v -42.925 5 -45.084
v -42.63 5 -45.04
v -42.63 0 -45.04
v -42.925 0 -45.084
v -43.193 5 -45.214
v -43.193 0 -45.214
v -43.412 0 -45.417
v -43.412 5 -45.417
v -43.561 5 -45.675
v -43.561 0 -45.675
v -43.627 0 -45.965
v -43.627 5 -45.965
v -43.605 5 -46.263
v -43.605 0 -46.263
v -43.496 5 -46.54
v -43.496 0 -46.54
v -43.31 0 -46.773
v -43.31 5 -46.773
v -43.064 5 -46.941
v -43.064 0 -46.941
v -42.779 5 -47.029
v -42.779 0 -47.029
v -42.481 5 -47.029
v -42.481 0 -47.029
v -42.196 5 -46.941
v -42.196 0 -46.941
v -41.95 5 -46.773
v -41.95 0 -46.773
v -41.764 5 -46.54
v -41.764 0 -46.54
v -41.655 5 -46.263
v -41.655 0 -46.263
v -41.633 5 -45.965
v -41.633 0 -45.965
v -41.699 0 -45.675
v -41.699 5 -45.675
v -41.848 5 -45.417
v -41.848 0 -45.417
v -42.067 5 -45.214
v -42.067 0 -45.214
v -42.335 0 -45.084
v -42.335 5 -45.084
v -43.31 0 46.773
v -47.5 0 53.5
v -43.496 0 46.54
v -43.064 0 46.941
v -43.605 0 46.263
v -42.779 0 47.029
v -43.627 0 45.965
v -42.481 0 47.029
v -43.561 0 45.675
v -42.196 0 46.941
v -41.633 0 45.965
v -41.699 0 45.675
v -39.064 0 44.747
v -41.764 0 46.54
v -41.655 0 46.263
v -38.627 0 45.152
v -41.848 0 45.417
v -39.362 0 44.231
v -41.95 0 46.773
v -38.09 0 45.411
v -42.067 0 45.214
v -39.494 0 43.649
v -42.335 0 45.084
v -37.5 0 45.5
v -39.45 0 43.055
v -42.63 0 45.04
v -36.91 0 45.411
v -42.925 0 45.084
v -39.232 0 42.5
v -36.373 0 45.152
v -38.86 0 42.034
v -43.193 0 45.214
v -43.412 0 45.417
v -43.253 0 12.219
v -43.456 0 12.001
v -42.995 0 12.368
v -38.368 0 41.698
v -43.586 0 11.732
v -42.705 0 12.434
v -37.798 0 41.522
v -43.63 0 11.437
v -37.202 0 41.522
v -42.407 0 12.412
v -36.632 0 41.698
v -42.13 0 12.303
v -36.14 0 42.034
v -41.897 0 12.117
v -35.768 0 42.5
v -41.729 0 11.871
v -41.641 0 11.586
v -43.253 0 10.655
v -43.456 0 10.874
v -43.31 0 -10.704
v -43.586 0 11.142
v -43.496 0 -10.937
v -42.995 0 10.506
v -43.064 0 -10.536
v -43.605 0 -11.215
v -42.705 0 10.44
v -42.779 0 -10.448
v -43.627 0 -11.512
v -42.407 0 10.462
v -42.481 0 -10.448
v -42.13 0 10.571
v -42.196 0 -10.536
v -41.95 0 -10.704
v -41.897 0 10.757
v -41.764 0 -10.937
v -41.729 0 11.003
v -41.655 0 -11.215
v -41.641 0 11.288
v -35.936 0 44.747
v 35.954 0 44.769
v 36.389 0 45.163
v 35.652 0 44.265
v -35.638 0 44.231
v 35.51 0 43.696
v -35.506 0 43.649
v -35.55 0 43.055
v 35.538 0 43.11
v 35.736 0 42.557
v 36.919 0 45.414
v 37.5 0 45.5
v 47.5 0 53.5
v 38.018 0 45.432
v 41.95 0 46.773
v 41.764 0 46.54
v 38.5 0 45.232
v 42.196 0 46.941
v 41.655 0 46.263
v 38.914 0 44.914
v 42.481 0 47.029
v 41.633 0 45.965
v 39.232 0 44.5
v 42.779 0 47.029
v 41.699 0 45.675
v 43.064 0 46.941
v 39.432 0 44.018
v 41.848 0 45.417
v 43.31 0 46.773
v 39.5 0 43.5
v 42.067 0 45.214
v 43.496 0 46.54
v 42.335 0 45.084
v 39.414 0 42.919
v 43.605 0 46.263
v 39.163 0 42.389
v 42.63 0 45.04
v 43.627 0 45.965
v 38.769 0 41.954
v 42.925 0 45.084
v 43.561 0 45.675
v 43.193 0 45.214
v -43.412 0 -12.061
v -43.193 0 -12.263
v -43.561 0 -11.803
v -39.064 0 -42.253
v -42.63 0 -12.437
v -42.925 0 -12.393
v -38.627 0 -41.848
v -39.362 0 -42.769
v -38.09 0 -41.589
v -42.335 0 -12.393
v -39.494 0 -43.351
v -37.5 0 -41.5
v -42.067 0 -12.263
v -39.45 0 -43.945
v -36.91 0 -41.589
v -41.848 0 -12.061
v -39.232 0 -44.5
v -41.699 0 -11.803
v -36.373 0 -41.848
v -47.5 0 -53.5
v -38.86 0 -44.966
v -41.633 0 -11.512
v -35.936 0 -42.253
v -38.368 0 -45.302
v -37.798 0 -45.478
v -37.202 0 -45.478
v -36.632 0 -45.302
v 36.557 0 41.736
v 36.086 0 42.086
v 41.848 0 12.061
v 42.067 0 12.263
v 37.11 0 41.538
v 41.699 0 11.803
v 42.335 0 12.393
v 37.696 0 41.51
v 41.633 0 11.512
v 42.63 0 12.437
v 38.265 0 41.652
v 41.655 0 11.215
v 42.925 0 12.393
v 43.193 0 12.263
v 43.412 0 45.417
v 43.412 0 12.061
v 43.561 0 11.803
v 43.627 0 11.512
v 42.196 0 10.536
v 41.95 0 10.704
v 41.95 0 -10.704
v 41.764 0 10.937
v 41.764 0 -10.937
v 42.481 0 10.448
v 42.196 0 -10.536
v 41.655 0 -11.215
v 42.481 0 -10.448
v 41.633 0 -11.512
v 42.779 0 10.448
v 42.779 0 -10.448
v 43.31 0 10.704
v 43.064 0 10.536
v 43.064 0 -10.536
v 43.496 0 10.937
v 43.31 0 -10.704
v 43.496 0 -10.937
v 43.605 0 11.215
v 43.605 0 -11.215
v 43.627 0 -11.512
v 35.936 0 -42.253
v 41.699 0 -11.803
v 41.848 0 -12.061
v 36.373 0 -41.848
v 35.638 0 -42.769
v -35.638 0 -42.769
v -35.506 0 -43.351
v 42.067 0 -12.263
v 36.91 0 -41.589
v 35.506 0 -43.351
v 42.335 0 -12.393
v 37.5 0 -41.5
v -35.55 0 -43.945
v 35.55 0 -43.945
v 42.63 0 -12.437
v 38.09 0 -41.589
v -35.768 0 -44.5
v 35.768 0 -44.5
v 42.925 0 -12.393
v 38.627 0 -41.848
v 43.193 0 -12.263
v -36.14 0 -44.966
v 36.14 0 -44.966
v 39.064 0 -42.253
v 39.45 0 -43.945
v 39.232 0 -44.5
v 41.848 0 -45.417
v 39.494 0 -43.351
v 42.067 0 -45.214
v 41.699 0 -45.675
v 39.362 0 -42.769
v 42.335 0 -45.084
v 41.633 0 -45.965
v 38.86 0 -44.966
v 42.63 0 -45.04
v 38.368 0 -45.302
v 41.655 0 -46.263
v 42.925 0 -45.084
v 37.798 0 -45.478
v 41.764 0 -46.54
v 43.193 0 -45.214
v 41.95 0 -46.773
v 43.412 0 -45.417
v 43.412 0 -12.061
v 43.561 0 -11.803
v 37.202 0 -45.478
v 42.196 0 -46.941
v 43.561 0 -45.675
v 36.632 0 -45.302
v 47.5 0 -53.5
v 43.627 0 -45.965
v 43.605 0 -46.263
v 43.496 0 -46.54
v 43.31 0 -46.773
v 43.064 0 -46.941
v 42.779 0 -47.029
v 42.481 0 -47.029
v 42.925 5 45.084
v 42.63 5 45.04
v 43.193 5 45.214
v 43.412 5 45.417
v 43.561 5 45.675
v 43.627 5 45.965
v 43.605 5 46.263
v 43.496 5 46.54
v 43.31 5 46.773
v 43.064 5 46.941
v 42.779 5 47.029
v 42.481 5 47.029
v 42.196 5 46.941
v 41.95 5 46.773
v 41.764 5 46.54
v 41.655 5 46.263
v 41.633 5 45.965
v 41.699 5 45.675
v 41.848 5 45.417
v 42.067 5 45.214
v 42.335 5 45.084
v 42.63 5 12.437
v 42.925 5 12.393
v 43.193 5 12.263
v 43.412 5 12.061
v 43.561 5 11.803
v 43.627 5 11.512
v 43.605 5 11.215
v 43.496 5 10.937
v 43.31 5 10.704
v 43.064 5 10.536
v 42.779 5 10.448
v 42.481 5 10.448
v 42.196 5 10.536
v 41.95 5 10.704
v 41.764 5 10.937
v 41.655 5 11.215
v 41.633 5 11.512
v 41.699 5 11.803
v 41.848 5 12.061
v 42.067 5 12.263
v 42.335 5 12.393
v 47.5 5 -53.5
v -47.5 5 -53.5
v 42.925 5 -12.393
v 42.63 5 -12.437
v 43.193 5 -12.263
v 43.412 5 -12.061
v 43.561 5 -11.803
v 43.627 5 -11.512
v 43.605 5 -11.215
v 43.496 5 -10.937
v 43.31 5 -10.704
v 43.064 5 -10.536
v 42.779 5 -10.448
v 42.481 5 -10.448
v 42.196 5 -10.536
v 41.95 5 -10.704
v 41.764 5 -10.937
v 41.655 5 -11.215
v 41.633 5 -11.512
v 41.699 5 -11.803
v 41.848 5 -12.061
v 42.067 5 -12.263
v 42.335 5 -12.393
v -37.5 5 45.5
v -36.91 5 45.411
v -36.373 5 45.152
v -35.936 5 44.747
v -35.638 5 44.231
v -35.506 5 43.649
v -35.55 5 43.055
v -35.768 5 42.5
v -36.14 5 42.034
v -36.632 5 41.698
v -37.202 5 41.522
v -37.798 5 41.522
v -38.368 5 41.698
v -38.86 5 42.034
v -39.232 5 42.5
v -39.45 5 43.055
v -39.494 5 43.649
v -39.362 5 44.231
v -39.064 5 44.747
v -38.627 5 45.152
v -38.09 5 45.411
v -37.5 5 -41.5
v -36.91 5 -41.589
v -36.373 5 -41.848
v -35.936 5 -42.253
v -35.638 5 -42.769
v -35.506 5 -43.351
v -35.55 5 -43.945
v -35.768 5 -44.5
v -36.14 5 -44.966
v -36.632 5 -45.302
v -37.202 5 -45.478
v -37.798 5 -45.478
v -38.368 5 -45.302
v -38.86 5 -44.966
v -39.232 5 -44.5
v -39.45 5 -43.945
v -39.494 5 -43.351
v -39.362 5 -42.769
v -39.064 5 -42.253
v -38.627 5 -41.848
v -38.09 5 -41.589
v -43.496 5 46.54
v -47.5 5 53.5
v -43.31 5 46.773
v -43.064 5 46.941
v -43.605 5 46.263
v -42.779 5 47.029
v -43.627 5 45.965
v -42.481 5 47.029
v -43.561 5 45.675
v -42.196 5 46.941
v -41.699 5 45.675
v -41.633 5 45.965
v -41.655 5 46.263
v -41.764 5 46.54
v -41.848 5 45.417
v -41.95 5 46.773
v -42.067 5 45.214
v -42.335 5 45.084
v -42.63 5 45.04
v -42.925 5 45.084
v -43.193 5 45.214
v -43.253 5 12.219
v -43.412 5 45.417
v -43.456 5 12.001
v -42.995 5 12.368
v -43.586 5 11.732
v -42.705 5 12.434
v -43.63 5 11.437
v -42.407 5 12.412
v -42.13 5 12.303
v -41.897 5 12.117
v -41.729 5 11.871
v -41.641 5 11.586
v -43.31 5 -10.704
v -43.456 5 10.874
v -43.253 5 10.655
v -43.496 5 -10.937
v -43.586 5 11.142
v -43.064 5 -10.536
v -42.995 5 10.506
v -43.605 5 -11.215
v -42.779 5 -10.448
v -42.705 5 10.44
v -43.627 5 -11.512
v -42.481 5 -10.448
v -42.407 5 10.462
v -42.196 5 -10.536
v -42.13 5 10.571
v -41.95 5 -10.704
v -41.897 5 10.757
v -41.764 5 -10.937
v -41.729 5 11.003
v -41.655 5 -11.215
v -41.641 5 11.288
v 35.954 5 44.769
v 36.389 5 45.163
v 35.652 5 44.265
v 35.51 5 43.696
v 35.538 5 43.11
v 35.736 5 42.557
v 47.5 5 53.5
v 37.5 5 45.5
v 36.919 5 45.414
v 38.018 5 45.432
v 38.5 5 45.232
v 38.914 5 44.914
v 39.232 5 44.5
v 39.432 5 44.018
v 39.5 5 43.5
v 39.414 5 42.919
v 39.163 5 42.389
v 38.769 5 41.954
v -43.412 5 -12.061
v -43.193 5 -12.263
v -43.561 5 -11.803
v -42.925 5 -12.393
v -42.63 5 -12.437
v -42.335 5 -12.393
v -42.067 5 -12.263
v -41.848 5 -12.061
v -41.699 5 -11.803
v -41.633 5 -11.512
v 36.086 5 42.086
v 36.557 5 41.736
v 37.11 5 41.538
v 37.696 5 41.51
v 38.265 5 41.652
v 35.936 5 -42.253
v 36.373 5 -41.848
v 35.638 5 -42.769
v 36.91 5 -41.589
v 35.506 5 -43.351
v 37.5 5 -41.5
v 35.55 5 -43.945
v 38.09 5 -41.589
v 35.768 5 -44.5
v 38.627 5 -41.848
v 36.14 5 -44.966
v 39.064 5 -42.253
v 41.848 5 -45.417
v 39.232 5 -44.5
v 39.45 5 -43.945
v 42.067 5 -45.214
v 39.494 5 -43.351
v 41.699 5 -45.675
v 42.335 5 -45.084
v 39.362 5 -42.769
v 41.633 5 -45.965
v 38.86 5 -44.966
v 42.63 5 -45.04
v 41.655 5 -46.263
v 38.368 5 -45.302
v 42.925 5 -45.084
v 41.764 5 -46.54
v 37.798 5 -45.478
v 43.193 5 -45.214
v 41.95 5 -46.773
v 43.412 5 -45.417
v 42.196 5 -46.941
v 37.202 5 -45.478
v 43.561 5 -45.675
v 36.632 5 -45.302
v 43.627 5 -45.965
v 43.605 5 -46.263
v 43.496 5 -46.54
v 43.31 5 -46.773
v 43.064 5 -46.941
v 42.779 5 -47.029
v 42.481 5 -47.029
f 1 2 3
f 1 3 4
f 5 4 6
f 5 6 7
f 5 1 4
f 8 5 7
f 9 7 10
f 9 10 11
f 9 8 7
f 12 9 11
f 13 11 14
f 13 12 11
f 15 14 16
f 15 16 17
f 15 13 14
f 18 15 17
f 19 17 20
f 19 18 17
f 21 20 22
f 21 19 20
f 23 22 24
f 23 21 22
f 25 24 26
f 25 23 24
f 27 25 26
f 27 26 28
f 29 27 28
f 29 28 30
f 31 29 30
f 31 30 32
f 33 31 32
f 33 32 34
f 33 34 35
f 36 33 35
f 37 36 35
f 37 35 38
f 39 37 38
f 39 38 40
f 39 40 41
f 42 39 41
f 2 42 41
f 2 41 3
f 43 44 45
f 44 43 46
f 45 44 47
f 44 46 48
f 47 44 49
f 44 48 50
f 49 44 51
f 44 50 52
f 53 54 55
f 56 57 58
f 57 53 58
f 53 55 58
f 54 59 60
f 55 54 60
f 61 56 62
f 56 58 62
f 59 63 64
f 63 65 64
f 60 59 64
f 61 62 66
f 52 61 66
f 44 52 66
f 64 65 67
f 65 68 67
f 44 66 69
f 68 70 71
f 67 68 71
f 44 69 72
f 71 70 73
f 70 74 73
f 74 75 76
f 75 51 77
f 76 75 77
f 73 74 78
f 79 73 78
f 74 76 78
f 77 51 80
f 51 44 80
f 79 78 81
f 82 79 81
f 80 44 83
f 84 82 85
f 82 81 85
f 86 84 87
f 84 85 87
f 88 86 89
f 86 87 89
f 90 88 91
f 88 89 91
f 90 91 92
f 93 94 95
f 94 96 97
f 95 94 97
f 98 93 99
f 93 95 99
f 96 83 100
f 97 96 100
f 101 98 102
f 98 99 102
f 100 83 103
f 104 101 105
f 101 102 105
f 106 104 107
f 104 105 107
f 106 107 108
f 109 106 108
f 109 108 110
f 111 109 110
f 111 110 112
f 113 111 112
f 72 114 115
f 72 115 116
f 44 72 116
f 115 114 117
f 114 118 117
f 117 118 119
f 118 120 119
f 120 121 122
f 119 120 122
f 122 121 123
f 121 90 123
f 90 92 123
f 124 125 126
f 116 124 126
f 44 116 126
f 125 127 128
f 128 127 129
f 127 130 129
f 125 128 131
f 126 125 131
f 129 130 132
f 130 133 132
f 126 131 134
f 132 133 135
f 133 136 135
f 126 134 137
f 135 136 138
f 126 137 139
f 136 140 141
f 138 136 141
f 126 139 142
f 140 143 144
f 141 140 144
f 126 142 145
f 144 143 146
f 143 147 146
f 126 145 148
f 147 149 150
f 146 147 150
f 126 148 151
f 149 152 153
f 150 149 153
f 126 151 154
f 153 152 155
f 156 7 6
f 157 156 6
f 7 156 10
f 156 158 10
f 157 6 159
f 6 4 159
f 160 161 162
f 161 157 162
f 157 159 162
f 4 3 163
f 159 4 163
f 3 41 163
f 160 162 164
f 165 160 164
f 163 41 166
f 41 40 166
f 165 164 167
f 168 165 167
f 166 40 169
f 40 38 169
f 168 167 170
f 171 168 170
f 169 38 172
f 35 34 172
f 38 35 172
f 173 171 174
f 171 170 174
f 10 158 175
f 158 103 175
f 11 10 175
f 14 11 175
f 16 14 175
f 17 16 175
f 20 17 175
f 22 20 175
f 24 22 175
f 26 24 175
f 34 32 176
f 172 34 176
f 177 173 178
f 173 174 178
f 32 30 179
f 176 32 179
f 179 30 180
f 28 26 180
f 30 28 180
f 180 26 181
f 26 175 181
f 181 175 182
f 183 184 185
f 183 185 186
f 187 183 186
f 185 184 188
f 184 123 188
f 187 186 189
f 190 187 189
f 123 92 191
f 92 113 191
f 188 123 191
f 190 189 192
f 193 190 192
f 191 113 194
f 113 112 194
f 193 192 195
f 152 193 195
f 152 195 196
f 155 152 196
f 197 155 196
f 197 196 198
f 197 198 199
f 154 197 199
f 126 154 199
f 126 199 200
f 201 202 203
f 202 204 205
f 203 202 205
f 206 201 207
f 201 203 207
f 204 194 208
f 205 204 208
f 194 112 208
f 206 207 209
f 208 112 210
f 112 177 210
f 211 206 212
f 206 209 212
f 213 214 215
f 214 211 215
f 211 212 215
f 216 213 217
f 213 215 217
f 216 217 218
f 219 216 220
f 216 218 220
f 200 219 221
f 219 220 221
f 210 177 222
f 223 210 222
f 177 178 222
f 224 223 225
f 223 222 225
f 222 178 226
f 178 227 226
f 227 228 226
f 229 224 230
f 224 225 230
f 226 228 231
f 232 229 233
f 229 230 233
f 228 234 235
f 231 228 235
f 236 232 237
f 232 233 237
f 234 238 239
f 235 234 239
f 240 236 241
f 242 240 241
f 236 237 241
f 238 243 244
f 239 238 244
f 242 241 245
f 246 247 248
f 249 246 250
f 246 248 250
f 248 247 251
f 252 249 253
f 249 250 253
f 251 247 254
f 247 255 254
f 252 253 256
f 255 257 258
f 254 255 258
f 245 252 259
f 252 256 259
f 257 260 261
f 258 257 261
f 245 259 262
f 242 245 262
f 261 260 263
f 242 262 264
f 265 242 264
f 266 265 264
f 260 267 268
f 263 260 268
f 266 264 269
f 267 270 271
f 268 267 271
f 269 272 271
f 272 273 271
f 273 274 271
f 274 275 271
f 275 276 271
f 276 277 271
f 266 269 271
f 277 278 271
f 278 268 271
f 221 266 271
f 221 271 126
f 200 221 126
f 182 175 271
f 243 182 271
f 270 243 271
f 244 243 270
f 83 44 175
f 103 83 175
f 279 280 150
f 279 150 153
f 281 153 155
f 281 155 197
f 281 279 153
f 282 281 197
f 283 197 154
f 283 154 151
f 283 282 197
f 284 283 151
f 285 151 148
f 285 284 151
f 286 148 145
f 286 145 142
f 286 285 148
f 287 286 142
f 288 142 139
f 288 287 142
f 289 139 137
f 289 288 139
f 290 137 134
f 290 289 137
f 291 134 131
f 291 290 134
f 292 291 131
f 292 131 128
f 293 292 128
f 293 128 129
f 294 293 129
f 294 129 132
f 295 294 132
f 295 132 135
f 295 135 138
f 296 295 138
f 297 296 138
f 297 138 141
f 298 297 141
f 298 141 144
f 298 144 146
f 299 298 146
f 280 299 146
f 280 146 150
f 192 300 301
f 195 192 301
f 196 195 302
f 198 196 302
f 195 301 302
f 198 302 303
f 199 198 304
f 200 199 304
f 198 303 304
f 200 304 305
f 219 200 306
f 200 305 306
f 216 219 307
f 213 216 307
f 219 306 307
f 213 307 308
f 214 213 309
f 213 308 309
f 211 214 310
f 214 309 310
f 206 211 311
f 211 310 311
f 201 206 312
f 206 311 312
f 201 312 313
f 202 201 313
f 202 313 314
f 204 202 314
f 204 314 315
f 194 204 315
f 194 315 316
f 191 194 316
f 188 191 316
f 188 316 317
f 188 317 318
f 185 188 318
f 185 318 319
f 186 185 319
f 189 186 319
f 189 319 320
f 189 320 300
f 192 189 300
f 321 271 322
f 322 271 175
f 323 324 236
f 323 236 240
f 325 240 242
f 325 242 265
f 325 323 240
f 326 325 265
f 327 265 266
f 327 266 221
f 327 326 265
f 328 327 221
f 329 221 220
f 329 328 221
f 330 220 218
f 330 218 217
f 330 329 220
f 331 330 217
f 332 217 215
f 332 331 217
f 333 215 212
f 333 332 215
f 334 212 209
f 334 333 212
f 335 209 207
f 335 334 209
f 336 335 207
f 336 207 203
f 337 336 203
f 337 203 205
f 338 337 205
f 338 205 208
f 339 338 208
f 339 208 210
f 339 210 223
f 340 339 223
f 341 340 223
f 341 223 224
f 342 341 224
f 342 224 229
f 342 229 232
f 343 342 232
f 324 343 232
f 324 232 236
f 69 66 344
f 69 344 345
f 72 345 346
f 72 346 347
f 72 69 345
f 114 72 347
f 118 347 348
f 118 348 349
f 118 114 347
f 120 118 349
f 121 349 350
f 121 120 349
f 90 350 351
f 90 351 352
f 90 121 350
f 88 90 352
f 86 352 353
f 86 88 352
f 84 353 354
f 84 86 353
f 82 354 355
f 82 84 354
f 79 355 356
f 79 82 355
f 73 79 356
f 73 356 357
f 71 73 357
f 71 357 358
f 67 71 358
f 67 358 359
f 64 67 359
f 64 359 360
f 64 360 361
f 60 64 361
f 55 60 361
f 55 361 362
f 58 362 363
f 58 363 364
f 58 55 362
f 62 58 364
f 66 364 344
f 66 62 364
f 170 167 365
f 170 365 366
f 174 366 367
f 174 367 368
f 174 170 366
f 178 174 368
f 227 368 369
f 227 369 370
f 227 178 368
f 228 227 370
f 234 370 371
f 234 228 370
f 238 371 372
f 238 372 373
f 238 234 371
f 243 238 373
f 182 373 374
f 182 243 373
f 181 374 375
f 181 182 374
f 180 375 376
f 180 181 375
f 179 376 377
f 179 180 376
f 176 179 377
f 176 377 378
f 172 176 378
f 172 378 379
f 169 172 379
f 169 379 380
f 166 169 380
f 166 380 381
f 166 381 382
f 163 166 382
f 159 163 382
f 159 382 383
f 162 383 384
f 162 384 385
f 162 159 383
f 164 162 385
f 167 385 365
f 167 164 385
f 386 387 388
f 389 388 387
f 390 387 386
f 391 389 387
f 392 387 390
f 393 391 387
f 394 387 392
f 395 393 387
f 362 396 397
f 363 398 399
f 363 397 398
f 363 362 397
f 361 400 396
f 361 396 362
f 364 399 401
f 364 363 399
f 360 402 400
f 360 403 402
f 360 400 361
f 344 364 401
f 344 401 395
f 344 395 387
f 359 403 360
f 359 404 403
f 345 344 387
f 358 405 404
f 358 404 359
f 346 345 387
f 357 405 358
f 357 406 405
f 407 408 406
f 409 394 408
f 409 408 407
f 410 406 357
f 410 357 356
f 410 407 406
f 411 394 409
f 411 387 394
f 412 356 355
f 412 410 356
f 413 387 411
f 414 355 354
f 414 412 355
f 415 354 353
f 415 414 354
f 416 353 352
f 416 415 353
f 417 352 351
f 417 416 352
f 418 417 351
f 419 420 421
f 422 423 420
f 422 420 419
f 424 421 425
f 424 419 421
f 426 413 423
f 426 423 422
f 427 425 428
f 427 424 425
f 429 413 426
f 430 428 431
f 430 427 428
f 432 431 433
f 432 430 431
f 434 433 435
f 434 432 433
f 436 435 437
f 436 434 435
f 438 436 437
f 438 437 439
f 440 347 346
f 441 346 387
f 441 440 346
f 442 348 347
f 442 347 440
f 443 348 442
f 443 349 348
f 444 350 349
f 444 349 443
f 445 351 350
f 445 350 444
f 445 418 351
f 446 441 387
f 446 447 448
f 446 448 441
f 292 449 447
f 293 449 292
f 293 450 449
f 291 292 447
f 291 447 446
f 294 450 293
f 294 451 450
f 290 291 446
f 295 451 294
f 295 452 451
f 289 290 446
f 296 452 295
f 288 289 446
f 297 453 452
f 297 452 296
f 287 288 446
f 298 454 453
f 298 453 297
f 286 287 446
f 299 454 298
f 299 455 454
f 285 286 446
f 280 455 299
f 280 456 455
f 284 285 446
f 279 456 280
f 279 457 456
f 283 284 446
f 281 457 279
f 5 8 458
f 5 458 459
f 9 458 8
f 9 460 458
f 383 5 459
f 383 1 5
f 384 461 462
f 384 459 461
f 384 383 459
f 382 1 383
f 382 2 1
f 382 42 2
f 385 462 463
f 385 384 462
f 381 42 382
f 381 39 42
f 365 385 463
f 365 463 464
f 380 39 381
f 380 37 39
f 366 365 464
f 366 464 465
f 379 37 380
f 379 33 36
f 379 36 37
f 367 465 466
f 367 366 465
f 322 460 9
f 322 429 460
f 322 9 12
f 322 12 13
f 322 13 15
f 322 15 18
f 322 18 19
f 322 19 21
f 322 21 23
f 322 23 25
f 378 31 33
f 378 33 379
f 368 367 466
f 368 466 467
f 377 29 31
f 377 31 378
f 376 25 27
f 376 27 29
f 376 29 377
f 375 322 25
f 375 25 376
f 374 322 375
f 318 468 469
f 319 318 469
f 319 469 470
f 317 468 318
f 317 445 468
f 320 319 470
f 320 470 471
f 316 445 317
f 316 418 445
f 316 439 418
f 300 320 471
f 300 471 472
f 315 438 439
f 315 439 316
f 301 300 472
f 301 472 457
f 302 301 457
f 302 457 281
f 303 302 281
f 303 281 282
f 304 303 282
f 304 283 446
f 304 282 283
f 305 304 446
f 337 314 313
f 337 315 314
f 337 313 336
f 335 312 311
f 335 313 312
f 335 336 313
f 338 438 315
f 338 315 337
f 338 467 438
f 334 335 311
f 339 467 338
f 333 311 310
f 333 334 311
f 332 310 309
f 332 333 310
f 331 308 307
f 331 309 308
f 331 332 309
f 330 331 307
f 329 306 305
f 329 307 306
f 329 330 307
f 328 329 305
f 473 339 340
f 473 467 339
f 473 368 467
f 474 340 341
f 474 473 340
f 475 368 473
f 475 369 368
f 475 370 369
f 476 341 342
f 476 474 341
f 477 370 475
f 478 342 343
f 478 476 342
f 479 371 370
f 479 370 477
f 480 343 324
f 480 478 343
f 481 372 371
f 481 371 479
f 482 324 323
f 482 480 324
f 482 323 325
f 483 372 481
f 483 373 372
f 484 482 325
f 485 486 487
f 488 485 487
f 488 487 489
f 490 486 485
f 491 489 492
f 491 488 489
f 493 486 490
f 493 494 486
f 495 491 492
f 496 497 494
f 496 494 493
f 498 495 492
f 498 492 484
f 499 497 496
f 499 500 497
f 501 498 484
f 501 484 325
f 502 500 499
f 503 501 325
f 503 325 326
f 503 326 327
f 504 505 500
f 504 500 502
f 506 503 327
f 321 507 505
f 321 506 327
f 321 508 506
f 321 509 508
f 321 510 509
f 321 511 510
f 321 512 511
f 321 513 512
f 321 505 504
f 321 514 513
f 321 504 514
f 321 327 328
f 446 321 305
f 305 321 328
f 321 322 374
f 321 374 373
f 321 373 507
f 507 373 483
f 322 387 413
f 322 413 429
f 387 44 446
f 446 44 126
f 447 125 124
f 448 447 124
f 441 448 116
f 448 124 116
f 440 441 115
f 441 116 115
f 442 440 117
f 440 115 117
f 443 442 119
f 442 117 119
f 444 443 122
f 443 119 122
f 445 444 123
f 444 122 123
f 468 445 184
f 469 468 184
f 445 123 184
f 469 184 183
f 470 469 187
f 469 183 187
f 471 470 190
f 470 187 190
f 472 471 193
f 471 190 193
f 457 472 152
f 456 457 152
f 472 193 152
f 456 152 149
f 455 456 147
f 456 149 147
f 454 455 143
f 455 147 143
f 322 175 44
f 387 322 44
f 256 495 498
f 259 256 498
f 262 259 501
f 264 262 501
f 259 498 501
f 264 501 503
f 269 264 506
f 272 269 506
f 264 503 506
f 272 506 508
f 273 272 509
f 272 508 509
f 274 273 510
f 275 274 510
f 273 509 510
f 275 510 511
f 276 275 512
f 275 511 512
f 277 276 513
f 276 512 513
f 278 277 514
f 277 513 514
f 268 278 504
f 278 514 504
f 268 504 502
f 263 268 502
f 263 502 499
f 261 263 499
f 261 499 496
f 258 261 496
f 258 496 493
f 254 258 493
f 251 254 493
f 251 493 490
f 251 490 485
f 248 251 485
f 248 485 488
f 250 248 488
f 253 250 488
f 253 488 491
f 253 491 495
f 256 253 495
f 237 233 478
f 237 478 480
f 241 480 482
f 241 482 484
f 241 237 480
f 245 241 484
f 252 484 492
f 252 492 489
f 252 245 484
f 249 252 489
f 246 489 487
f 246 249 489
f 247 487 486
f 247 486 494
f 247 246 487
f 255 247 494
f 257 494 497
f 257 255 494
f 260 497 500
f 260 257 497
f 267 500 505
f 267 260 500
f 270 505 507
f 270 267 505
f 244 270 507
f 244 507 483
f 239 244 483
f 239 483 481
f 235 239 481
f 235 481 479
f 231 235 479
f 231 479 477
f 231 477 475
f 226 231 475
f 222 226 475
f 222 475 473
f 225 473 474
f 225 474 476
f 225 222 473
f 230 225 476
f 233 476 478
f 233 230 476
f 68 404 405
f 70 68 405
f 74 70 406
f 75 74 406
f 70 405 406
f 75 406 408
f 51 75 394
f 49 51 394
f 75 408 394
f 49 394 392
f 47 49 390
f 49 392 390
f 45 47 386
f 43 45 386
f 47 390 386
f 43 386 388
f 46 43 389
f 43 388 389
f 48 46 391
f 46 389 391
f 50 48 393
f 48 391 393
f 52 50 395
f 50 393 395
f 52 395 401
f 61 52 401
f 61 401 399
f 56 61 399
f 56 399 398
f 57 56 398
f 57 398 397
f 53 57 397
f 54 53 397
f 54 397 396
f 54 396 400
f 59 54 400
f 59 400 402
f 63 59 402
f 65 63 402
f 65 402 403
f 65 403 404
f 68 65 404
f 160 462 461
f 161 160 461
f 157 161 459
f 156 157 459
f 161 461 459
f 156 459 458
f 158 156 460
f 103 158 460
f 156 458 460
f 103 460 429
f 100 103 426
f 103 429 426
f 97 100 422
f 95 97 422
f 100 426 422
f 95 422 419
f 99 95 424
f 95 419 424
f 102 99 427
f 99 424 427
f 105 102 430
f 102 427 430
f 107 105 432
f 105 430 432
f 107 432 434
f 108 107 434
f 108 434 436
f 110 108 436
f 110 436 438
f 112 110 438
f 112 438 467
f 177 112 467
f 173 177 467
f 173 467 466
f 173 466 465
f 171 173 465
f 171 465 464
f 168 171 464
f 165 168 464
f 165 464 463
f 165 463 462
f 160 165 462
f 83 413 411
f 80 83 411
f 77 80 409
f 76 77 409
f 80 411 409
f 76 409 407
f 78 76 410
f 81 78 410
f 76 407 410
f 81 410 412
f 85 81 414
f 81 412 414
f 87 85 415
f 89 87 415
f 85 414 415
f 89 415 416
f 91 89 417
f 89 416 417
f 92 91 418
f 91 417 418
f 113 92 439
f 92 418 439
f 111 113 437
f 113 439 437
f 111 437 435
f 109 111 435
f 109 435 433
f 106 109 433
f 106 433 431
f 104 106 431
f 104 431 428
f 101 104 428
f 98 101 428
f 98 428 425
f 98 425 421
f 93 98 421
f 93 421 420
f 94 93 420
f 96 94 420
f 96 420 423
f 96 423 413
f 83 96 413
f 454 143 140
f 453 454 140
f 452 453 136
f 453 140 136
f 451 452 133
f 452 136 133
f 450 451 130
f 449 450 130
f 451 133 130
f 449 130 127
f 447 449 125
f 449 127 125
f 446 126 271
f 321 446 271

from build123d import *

# Parameters (mm, degrees)
SKETCH2_R                                  = 2
BOSS_EXTRUDE1_DEPTH                        = 5
CUT_EXTRUDE1_REACH                         = 73.718
SKETCH4_R                                  = 1
MIRROR2_COPY_1_REACH                       = 73.718
MIRROR2_COPY_1_SKETCH_R                    = 1
MIRROR2_AT_THE_SECOND_PLANE_COPY_1_REACH   = 73.718
MIRROR2_AT_THE_SECOND_PLANE_COPY_1_SKETC_R = 1
MIRROR2_AT_THE_SECOND_PLANE_COPY_2_REACH   = 73.718
MIRROR2_AT_THE_SECOND_PLANE_COPY_2_SKETC_R = 1
MIRROR2_AT_THE_SECOND_PLANE_COPY_3_REACH   = 73.718
MIRROR2_AT_THE_SECOND_PLANE_COPY_3_SKETC_R = 1


with BuildPart() as part:
    # Sketch2 → Boss-Extrude1 (new body)
    # profile 1 of 2: a face of its own
    with BuildSketch(Plane(origin=(0, 0, 0), x_dir=(1, 0, 0), z_dir=(0, 1, 0))):
        with BuildLine():
            ThreePointArc((37.5, -45.5), (36.085786438, -42.085786438), (39.5, -43.5))
            Line((39.5, -43.5), (47.5, -43.5))
            Line((47.5, -43.5), (47.5, 53.5))
            Line((47.5, 53.5), (-47.5, 53.5))
            Line((-47.5, 53.5), (-47.5, -53.5))
            Line((-47.5, -53.5), (37.5, -53.5))
            Line((37.5, -53.5), (37.5, -45.5))
        make_face()
        with Locations(Location((-37.5, -43.5, 0), (0, 0, 270))):
            Circle(SKETCH2_R, mode=Mode.SUBTRACT)
        with Locations(Location((-37.5, 43.5, 0), (0, 0, 270))):
            Circle(SKETCH2_R, mode=Mode.SUBTRACT)
        with Locations(Location((37.5, 43.5, 0), (0, 0, 270))):
            Circle(SKETCH2_R, mode=Mode.SUBTRACT)
    # profile 2 of 2: a face of its own
    with BuildSketch(Plane(origin=(0, 0, 0), x_dir=(1, 0, 0), z_dir=(0, 1, 0))):
        with BuildLine():
            Line((47.5, -43.5), (39.5, -43.5))
            ThreePointArc((39.5, -43.5), (38.914213562, -44.914213562), (37.5, -45.5))
            Line((37.5, -45.5), (37.5, -53.5))
            Line((37.5, -53.5), (47.5, -53.5))
            Line((47.5, -53.5), (47.5, -43.5))
        make_face()
    extrude(amount=BOSS_EXTRUDE1_DEPTH)

    # Sketch4 → Cut-Extrude1 (cut, up to next)
    with BuildSketch(Plane(origin=(0, 5, 0), x_dir=(1, 0, 0), z_dir=(0, 1, 0)), mode=Mode.PRIVATE) as cut_extrude1_sk1:
        with Locations(Location((42.63, 46.04, 0), (0, 0, 270))):
            Circle(SKETCH4_R)
    cut_extrude1_tool1 = extrude(cut_extrude1_sk1.sketch, amount=-CUT_EXTRUDE1_REACH, mode=Mode.PRIVATE) & part.part
    cut_extrude1 = cut_extrude1_tool1.solids().sort_by_distance((42.63, 5, -46.04))[0]
    add(cut_extrude1, mode=Mode.SUBTRACT)

    # Mirror1: Cut-Extrude1 across plane
    add(cut_extrude1.mirror(Plane(origin=(0, 0, -28.738611276), x_dir=(1, 0, 0), z_dir=(0, 0, -1))), mode=Mode.SUBTRACT)

    # Mirror2: Cut-Extrude1 across plane
    add(cut_extrude1.mirror(Plane(origin=(0, 0, 0), x_dir=(0, 0, 1), z_dir=(1, 0, 0))), mode=Mode.SUBTRACT)

    # Mirror2 copy 1 sketch → Mirror2 copy 1 (cut, up to next)
    with BuildSketch(Plane(origin=(0, 5, -57.477222552), x_dir=(-1, 0, 0), z_dir=(0, 1, 0)), mode=Mode.PRIVATE) as mirror2_copy_1_sk1:
        with Locations(Location((42.63, 46.04, 0), (0, 0, 270))):
            Circle(MIRROR2_COPY_1_SKETCH_R)
    mirror2_copy_1_tool1 = extrude(mirror2_copy_1_sk1.sketch, amount=-MIRROR2_COPY_1_REACH, mode=Mode.PRIVATE) & part.part
    add(mirror2_copy_1_tool1.solids().sort_by_distance((-42.63, 5, -11.437222552))[0], mode=Mode.SUBTRACT)

    # Mirror2 at the second plane: Cut-Extrude1 across plane
    add(cut_extrude1.mirror(Plane.XY), mode=Mode.SUBTRACT)

    # Mirror2 at the second plane copy 1 sketc → Mirror2 at the second plane copy 1 (cut, up to next)
    with BuildSketch(Plane(origin=(0, 5, 57.477222552), x_dir=(1, 0, 0), z_dir=(0, 1, 0)), mode=Mode.PRIVATE) as mirror2_at_the_second_plane_copy_1_sk1:
        with Locations(Location((42.63, 46.04, 0), (0, 0, 270))):
            Circle(MIRROR2_AT_THE_SECOND_PLANE_COPY_1_SKETC_R)
    mirror2_at_the_second_plane_copy_1_tool1 = extrude(mirror2_at_the_second_plane_copy_1_sk1.sketch, amount=-MIRROR2_AT_THE_SECOND_PLANE_COPY_1_REACH, mode=Mode.PRIVATE) & part.part
    add(mirror2_at_the_second_plane_copy_1_tool1.solids().sort_by_distance((42.63, 5, 11.437222552))[0], mode=Mode.SUBTRACT)

    # Mirror2 at the second plane copy 2 sketc → Mirror2 at the second plane copy 2 (cut, up to next)
    with BuildSketch(Plane(origin=(0, 5, 0), x_dir=(-1, 0, 0), z_dir=(0, 1, 0)), mode=Mode.PRIVATE) as mirror2_at_the_second_plane_copy_2_sk1:
        with Locations(Location((42.63, 46.04, 0), (0, 0, 270))):
            Circle(MIRROR2_AT_THE_SECOND_PLANE_COPY_2_SKETC_R)
    mirror2_at_the_second_plane_copy_2_tool1 = extrude(mirror2_at_the_second_plane_copy_2_sk1.sketch, amount=-MIRROR2_AT_THE_SECOND_PLANE_COPY_2_REACH, mode=Mode.PRIVATE) & part.part
    add(mirror2_at_the_second_plane_copy_2_tool1.solids().sort_by_distance((-42.63, 5, 46.04))[0], mode=Mode.SUBTRACT)

    # Mirror2 at the second plane copy 3 sketc → Mirror2 at the second plane copy 3 (cut, up to next)
    with BuildSketch(Plane(origin=(0, 5, 57.477222552), x_dir=(-1, 0, 0), z_dir=(0, 1, 0)), mode=Mode.PRIVATE) as mirror2_at_the_second_plane_copy_3_sk1:
        with Locations((42.63, -46.04)):
            Circle(MIRROR2_AT_THE_SECOND_PLANE_COPY_3_SKETC_R)
    mirror2_at_the_second_plane_copy_3_tool1 = extrude(mirror2_at_the_second_plane_copy_3_sk1.sketch, amount=-MIRROR2_AT_THE_SECOND_PLANE_COPY_3_REACH, mode=Mode.PRIVATE) & part.part
    add(mirror2_at_the_second_plane_copy_3_tool1.solids().sort_by_distance((-42.63, 5, 11.437222552))[0], mode=Mode.SUBTRACT)


solid = part.part
